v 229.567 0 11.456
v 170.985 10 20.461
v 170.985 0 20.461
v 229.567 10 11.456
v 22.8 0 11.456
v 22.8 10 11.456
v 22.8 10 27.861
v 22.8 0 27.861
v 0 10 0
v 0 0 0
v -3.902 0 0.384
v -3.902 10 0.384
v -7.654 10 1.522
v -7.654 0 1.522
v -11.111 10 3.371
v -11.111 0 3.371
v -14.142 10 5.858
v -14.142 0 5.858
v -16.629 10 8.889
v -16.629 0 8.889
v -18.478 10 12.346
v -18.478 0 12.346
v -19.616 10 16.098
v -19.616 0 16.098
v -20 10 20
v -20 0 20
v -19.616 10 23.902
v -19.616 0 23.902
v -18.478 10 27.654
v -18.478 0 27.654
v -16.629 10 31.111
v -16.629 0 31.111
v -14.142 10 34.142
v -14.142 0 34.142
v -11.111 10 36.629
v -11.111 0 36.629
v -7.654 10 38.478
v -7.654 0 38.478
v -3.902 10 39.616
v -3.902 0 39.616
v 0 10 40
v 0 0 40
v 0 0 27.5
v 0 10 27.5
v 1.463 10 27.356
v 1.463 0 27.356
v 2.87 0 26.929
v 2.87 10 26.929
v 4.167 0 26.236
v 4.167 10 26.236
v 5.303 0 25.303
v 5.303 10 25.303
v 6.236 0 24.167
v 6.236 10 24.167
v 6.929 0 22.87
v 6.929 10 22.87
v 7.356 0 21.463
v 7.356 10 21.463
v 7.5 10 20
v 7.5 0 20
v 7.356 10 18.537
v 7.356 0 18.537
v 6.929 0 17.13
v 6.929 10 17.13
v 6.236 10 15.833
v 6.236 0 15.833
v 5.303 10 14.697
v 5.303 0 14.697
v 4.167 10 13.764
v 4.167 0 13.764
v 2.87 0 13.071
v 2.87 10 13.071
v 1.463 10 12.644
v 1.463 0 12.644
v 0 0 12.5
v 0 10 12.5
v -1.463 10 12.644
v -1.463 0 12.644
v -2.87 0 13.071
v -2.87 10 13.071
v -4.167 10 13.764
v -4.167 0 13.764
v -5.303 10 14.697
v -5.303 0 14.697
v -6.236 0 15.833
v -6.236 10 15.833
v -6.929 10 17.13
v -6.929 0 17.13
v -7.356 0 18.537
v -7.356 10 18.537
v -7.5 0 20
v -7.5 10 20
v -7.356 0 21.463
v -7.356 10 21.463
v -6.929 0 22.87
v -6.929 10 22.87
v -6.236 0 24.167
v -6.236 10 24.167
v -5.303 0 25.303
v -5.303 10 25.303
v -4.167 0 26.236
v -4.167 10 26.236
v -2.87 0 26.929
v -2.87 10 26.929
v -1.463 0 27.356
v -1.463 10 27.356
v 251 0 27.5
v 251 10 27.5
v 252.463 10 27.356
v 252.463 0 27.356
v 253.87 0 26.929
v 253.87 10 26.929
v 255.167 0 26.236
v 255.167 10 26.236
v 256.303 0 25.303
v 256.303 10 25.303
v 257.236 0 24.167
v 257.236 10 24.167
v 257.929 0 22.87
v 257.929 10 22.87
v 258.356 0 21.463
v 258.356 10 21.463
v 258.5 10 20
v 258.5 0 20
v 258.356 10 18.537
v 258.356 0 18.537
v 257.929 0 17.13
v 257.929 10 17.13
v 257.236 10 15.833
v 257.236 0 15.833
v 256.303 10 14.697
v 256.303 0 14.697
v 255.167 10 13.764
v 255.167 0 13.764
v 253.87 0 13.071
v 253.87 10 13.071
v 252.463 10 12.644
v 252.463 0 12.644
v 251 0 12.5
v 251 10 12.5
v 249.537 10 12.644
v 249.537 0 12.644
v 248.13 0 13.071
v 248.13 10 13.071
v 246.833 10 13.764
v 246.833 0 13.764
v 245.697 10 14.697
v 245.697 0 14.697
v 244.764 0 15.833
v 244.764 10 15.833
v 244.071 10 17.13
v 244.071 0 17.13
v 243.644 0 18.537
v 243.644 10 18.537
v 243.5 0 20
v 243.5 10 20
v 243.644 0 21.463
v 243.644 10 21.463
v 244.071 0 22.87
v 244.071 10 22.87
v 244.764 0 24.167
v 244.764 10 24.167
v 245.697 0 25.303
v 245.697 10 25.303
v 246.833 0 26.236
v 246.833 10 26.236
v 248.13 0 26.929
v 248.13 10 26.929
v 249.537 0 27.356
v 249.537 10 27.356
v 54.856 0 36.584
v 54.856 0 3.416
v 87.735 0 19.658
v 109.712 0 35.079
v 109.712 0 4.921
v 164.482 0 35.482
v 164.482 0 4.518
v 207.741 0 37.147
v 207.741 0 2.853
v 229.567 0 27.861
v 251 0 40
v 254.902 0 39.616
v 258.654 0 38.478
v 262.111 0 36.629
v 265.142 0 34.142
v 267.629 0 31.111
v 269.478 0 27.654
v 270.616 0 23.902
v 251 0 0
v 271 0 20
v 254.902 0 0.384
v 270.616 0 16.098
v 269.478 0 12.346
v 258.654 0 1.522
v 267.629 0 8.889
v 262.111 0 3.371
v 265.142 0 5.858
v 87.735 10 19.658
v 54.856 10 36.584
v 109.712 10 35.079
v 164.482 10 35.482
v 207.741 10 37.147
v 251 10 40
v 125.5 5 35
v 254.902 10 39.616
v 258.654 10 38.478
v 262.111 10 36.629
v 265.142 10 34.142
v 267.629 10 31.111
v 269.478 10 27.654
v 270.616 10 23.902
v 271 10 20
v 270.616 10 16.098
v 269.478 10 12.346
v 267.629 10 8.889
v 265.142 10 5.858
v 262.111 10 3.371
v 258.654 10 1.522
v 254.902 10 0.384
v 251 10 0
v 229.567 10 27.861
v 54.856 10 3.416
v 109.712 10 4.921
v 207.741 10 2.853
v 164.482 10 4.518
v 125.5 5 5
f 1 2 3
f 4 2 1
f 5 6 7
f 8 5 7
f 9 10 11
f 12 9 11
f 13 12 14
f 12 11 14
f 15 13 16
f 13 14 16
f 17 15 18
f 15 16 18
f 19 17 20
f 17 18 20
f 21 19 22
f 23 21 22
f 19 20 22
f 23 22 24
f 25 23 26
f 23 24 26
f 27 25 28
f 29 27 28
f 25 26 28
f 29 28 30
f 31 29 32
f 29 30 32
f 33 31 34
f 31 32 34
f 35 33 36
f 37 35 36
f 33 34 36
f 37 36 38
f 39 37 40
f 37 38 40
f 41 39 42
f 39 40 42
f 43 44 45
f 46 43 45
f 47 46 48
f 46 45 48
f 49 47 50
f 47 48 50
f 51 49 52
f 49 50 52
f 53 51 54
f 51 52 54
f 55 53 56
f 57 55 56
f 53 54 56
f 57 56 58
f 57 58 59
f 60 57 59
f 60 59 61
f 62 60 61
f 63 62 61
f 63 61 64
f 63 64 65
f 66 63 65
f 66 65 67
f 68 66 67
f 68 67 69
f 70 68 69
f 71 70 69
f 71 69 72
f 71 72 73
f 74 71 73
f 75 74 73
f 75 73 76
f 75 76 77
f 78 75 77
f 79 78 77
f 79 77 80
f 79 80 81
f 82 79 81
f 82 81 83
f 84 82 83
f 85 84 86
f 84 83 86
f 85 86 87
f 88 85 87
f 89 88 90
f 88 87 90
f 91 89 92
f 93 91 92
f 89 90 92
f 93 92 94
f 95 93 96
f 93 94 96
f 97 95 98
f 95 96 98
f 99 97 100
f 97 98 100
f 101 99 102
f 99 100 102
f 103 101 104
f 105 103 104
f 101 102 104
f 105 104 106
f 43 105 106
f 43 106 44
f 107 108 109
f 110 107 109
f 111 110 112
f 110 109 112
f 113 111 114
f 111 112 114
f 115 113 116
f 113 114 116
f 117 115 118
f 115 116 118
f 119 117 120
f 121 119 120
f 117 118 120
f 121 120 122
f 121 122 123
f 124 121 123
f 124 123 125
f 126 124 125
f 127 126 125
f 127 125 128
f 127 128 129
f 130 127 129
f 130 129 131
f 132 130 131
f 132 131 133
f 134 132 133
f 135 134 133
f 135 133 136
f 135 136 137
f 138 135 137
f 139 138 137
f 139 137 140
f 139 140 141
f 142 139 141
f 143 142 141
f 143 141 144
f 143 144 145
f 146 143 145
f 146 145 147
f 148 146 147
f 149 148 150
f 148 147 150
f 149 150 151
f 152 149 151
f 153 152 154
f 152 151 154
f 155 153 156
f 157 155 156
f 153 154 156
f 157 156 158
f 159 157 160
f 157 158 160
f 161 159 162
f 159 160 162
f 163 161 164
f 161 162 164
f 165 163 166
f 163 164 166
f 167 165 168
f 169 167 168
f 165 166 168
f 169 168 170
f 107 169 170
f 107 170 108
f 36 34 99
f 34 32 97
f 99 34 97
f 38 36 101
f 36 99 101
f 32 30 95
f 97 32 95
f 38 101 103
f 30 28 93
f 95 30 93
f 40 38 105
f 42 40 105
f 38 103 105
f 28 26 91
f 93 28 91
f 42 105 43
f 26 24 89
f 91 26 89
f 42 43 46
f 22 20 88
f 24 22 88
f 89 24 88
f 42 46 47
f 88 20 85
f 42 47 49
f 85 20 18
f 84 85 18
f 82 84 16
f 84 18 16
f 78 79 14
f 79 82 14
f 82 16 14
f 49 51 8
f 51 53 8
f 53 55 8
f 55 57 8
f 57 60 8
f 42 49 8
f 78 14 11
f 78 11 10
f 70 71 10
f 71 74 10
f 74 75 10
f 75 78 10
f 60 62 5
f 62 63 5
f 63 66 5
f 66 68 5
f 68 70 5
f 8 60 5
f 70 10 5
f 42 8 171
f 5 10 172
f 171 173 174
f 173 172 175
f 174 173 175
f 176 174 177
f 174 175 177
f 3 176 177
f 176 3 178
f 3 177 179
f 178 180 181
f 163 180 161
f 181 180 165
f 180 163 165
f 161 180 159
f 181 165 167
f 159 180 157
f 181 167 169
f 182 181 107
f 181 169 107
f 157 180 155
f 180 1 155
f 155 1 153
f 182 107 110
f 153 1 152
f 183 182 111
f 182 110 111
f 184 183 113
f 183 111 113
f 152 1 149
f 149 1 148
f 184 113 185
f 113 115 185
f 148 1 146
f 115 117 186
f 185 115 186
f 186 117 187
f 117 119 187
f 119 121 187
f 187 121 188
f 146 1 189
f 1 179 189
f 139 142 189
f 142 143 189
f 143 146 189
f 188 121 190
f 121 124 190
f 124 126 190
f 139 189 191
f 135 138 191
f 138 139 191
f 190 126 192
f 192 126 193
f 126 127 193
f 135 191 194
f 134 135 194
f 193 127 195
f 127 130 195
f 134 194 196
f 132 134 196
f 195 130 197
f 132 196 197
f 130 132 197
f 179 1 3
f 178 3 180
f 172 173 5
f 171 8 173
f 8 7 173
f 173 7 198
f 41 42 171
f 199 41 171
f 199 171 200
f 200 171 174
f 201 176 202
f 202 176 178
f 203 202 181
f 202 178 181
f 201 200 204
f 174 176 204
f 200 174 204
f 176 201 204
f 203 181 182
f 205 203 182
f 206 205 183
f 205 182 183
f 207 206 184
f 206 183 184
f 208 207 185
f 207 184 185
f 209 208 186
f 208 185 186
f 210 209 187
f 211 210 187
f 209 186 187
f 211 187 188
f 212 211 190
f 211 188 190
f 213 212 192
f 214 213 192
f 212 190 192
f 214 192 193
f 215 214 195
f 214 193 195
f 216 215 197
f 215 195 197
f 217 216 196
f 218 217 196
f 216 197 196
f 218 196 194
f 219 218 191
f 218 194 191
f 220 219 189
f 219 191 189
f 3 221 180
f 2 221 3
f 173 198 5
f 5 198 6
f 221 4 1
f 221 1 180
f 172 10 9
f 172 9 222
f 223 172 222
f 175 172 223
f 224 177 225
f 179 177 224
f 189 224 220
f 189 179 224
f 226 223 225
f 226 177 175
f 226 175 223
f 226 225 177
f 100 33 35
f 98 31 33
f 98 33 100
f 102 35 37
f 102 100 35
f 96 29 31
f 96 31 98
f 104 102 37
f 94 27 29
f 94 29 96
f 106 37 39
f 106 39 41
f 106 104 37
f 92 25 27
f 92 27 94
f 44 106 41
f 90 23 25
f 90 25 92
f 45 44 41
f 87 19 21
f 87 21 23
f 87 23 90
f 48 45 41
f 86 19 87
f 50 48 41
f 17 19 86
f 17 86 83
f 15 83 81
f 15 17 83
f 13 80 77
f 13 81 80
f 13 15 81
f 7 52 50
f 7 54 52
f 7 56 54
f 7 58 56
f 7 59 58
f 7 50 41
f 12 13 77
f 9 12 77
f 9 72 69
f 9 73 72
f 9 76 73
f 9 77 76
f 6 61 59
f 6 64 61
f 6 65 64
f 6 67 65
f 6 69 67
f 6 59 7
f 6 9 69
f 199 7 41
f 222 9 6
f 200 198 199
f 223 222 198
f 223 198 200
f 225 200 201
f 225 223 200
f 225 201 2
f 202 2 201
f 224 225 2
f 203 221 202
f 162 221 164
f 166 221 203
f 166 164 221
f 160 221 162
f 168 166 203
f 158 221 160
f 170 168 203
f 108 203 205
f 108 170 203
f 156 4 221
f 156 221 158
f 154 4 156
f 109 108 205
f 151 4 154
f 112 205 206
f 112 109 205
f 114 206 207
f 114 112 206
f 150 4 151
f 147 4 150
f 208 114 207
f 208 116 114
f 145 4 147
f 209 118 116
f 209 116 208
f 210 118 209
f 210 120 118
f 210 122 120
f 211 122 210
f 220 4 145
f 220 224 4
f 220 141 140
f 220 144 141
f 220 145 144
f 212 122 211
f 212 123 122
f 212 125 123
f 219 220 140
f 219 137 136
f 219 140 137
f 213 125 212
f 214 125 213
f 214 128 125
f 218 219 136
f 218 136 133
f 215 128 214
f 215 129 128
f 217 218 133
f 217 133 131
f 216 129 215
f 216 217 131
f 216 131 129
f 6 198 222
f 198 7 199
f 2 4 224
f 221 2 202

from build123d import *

# Parameters (mm, degrees)
EXTRUDE_1_DEPTH     = 10
SKETCH_2_R          = 7.5
CUT_EXTRUDE_1_DEPTH = 275.118587593
SKETCH_3_R          = 7.5
CUT_EXTRUDE_2_DEPTH = 275.118587593
CUT_EXTRUDE_3_DEPTH = 275.118587593


with BuildPart() as part:
    # 草图1 → 凸台-拉伸1 (new body)
    with BuildSketch(Plane(origin=(0, 0, 0), x_dir=(1, 0, 0), z_dir=(0, 1, 0))):
        with BuildLine():
            ThreePointArc((0, 0), (-20, -20), (0, -40))
            add(Edge.make_bspline(
                [(0, -40), (125.5, -30), (251, -40)],
                knots=[0, 0, 0, 1, 1, 1], degree=2))
            ThreePointArc((251, -40), (271, -20), (251, 0))
            add(Edge.make_bspline(
                [(0, 0), (125.5, -10), (251, 0)],
                knots=[0, 0, 0, 1, 1, 1], degree=2))
        make_face()
    extrude(amount=EXTRUDE_1_DEPTH)

    # 草图2 → 切除-拉伸1 (cut, through all)
    with BuildSketch(Plane(origin=(0, 10, 0), x_dir=(1, 0, 0), z_dir=(0, 1, 0))):
        with Locations(Location((0, -20, 0), (0, 0, 270))):
            Circle(SKETCH_2_R)
    extrude(amount=-CUT_EXTRUDE_1_DEPTH, mode=Mode.SUBTRACT)

    # 草图3 → 切除-拉伸2 (cut, through all)
    with BuildSketch(Plane(origin=(0, 10, 0), x_dir=(1, 0, 0), z_dir=(0, 1, 0))):
        with Locations(Location((251, -20, 0), (0, 0, 270))):
            Circle(SKETCH_3_R)
    extrude(amount=-CUT_EXTRUDE_2_DEPTH, mode=Mode.SUBTRACT)

    # 草图4 → 切除-拉伸3 (cut, through all)
    with BuildSketch(Plane(origin=(0, 10, 0), x_dir=(1, 0, 0), z_dir=(0, 1, 0))):
        Polygon((22.799917897, -11.455899991), (22.799917897, -27.860572008), (87.735077962, -19.658236), align=None)
        Polygon((229.567138104, -11.455899991), (229.567138104, -27.860572008), (170.98456159, -20.460667606), align=None)
    extrude(amount=-CUT_EXTRUDE_3_DEPTH, mode=Mode.SUBTRACT)


solid = part.part
